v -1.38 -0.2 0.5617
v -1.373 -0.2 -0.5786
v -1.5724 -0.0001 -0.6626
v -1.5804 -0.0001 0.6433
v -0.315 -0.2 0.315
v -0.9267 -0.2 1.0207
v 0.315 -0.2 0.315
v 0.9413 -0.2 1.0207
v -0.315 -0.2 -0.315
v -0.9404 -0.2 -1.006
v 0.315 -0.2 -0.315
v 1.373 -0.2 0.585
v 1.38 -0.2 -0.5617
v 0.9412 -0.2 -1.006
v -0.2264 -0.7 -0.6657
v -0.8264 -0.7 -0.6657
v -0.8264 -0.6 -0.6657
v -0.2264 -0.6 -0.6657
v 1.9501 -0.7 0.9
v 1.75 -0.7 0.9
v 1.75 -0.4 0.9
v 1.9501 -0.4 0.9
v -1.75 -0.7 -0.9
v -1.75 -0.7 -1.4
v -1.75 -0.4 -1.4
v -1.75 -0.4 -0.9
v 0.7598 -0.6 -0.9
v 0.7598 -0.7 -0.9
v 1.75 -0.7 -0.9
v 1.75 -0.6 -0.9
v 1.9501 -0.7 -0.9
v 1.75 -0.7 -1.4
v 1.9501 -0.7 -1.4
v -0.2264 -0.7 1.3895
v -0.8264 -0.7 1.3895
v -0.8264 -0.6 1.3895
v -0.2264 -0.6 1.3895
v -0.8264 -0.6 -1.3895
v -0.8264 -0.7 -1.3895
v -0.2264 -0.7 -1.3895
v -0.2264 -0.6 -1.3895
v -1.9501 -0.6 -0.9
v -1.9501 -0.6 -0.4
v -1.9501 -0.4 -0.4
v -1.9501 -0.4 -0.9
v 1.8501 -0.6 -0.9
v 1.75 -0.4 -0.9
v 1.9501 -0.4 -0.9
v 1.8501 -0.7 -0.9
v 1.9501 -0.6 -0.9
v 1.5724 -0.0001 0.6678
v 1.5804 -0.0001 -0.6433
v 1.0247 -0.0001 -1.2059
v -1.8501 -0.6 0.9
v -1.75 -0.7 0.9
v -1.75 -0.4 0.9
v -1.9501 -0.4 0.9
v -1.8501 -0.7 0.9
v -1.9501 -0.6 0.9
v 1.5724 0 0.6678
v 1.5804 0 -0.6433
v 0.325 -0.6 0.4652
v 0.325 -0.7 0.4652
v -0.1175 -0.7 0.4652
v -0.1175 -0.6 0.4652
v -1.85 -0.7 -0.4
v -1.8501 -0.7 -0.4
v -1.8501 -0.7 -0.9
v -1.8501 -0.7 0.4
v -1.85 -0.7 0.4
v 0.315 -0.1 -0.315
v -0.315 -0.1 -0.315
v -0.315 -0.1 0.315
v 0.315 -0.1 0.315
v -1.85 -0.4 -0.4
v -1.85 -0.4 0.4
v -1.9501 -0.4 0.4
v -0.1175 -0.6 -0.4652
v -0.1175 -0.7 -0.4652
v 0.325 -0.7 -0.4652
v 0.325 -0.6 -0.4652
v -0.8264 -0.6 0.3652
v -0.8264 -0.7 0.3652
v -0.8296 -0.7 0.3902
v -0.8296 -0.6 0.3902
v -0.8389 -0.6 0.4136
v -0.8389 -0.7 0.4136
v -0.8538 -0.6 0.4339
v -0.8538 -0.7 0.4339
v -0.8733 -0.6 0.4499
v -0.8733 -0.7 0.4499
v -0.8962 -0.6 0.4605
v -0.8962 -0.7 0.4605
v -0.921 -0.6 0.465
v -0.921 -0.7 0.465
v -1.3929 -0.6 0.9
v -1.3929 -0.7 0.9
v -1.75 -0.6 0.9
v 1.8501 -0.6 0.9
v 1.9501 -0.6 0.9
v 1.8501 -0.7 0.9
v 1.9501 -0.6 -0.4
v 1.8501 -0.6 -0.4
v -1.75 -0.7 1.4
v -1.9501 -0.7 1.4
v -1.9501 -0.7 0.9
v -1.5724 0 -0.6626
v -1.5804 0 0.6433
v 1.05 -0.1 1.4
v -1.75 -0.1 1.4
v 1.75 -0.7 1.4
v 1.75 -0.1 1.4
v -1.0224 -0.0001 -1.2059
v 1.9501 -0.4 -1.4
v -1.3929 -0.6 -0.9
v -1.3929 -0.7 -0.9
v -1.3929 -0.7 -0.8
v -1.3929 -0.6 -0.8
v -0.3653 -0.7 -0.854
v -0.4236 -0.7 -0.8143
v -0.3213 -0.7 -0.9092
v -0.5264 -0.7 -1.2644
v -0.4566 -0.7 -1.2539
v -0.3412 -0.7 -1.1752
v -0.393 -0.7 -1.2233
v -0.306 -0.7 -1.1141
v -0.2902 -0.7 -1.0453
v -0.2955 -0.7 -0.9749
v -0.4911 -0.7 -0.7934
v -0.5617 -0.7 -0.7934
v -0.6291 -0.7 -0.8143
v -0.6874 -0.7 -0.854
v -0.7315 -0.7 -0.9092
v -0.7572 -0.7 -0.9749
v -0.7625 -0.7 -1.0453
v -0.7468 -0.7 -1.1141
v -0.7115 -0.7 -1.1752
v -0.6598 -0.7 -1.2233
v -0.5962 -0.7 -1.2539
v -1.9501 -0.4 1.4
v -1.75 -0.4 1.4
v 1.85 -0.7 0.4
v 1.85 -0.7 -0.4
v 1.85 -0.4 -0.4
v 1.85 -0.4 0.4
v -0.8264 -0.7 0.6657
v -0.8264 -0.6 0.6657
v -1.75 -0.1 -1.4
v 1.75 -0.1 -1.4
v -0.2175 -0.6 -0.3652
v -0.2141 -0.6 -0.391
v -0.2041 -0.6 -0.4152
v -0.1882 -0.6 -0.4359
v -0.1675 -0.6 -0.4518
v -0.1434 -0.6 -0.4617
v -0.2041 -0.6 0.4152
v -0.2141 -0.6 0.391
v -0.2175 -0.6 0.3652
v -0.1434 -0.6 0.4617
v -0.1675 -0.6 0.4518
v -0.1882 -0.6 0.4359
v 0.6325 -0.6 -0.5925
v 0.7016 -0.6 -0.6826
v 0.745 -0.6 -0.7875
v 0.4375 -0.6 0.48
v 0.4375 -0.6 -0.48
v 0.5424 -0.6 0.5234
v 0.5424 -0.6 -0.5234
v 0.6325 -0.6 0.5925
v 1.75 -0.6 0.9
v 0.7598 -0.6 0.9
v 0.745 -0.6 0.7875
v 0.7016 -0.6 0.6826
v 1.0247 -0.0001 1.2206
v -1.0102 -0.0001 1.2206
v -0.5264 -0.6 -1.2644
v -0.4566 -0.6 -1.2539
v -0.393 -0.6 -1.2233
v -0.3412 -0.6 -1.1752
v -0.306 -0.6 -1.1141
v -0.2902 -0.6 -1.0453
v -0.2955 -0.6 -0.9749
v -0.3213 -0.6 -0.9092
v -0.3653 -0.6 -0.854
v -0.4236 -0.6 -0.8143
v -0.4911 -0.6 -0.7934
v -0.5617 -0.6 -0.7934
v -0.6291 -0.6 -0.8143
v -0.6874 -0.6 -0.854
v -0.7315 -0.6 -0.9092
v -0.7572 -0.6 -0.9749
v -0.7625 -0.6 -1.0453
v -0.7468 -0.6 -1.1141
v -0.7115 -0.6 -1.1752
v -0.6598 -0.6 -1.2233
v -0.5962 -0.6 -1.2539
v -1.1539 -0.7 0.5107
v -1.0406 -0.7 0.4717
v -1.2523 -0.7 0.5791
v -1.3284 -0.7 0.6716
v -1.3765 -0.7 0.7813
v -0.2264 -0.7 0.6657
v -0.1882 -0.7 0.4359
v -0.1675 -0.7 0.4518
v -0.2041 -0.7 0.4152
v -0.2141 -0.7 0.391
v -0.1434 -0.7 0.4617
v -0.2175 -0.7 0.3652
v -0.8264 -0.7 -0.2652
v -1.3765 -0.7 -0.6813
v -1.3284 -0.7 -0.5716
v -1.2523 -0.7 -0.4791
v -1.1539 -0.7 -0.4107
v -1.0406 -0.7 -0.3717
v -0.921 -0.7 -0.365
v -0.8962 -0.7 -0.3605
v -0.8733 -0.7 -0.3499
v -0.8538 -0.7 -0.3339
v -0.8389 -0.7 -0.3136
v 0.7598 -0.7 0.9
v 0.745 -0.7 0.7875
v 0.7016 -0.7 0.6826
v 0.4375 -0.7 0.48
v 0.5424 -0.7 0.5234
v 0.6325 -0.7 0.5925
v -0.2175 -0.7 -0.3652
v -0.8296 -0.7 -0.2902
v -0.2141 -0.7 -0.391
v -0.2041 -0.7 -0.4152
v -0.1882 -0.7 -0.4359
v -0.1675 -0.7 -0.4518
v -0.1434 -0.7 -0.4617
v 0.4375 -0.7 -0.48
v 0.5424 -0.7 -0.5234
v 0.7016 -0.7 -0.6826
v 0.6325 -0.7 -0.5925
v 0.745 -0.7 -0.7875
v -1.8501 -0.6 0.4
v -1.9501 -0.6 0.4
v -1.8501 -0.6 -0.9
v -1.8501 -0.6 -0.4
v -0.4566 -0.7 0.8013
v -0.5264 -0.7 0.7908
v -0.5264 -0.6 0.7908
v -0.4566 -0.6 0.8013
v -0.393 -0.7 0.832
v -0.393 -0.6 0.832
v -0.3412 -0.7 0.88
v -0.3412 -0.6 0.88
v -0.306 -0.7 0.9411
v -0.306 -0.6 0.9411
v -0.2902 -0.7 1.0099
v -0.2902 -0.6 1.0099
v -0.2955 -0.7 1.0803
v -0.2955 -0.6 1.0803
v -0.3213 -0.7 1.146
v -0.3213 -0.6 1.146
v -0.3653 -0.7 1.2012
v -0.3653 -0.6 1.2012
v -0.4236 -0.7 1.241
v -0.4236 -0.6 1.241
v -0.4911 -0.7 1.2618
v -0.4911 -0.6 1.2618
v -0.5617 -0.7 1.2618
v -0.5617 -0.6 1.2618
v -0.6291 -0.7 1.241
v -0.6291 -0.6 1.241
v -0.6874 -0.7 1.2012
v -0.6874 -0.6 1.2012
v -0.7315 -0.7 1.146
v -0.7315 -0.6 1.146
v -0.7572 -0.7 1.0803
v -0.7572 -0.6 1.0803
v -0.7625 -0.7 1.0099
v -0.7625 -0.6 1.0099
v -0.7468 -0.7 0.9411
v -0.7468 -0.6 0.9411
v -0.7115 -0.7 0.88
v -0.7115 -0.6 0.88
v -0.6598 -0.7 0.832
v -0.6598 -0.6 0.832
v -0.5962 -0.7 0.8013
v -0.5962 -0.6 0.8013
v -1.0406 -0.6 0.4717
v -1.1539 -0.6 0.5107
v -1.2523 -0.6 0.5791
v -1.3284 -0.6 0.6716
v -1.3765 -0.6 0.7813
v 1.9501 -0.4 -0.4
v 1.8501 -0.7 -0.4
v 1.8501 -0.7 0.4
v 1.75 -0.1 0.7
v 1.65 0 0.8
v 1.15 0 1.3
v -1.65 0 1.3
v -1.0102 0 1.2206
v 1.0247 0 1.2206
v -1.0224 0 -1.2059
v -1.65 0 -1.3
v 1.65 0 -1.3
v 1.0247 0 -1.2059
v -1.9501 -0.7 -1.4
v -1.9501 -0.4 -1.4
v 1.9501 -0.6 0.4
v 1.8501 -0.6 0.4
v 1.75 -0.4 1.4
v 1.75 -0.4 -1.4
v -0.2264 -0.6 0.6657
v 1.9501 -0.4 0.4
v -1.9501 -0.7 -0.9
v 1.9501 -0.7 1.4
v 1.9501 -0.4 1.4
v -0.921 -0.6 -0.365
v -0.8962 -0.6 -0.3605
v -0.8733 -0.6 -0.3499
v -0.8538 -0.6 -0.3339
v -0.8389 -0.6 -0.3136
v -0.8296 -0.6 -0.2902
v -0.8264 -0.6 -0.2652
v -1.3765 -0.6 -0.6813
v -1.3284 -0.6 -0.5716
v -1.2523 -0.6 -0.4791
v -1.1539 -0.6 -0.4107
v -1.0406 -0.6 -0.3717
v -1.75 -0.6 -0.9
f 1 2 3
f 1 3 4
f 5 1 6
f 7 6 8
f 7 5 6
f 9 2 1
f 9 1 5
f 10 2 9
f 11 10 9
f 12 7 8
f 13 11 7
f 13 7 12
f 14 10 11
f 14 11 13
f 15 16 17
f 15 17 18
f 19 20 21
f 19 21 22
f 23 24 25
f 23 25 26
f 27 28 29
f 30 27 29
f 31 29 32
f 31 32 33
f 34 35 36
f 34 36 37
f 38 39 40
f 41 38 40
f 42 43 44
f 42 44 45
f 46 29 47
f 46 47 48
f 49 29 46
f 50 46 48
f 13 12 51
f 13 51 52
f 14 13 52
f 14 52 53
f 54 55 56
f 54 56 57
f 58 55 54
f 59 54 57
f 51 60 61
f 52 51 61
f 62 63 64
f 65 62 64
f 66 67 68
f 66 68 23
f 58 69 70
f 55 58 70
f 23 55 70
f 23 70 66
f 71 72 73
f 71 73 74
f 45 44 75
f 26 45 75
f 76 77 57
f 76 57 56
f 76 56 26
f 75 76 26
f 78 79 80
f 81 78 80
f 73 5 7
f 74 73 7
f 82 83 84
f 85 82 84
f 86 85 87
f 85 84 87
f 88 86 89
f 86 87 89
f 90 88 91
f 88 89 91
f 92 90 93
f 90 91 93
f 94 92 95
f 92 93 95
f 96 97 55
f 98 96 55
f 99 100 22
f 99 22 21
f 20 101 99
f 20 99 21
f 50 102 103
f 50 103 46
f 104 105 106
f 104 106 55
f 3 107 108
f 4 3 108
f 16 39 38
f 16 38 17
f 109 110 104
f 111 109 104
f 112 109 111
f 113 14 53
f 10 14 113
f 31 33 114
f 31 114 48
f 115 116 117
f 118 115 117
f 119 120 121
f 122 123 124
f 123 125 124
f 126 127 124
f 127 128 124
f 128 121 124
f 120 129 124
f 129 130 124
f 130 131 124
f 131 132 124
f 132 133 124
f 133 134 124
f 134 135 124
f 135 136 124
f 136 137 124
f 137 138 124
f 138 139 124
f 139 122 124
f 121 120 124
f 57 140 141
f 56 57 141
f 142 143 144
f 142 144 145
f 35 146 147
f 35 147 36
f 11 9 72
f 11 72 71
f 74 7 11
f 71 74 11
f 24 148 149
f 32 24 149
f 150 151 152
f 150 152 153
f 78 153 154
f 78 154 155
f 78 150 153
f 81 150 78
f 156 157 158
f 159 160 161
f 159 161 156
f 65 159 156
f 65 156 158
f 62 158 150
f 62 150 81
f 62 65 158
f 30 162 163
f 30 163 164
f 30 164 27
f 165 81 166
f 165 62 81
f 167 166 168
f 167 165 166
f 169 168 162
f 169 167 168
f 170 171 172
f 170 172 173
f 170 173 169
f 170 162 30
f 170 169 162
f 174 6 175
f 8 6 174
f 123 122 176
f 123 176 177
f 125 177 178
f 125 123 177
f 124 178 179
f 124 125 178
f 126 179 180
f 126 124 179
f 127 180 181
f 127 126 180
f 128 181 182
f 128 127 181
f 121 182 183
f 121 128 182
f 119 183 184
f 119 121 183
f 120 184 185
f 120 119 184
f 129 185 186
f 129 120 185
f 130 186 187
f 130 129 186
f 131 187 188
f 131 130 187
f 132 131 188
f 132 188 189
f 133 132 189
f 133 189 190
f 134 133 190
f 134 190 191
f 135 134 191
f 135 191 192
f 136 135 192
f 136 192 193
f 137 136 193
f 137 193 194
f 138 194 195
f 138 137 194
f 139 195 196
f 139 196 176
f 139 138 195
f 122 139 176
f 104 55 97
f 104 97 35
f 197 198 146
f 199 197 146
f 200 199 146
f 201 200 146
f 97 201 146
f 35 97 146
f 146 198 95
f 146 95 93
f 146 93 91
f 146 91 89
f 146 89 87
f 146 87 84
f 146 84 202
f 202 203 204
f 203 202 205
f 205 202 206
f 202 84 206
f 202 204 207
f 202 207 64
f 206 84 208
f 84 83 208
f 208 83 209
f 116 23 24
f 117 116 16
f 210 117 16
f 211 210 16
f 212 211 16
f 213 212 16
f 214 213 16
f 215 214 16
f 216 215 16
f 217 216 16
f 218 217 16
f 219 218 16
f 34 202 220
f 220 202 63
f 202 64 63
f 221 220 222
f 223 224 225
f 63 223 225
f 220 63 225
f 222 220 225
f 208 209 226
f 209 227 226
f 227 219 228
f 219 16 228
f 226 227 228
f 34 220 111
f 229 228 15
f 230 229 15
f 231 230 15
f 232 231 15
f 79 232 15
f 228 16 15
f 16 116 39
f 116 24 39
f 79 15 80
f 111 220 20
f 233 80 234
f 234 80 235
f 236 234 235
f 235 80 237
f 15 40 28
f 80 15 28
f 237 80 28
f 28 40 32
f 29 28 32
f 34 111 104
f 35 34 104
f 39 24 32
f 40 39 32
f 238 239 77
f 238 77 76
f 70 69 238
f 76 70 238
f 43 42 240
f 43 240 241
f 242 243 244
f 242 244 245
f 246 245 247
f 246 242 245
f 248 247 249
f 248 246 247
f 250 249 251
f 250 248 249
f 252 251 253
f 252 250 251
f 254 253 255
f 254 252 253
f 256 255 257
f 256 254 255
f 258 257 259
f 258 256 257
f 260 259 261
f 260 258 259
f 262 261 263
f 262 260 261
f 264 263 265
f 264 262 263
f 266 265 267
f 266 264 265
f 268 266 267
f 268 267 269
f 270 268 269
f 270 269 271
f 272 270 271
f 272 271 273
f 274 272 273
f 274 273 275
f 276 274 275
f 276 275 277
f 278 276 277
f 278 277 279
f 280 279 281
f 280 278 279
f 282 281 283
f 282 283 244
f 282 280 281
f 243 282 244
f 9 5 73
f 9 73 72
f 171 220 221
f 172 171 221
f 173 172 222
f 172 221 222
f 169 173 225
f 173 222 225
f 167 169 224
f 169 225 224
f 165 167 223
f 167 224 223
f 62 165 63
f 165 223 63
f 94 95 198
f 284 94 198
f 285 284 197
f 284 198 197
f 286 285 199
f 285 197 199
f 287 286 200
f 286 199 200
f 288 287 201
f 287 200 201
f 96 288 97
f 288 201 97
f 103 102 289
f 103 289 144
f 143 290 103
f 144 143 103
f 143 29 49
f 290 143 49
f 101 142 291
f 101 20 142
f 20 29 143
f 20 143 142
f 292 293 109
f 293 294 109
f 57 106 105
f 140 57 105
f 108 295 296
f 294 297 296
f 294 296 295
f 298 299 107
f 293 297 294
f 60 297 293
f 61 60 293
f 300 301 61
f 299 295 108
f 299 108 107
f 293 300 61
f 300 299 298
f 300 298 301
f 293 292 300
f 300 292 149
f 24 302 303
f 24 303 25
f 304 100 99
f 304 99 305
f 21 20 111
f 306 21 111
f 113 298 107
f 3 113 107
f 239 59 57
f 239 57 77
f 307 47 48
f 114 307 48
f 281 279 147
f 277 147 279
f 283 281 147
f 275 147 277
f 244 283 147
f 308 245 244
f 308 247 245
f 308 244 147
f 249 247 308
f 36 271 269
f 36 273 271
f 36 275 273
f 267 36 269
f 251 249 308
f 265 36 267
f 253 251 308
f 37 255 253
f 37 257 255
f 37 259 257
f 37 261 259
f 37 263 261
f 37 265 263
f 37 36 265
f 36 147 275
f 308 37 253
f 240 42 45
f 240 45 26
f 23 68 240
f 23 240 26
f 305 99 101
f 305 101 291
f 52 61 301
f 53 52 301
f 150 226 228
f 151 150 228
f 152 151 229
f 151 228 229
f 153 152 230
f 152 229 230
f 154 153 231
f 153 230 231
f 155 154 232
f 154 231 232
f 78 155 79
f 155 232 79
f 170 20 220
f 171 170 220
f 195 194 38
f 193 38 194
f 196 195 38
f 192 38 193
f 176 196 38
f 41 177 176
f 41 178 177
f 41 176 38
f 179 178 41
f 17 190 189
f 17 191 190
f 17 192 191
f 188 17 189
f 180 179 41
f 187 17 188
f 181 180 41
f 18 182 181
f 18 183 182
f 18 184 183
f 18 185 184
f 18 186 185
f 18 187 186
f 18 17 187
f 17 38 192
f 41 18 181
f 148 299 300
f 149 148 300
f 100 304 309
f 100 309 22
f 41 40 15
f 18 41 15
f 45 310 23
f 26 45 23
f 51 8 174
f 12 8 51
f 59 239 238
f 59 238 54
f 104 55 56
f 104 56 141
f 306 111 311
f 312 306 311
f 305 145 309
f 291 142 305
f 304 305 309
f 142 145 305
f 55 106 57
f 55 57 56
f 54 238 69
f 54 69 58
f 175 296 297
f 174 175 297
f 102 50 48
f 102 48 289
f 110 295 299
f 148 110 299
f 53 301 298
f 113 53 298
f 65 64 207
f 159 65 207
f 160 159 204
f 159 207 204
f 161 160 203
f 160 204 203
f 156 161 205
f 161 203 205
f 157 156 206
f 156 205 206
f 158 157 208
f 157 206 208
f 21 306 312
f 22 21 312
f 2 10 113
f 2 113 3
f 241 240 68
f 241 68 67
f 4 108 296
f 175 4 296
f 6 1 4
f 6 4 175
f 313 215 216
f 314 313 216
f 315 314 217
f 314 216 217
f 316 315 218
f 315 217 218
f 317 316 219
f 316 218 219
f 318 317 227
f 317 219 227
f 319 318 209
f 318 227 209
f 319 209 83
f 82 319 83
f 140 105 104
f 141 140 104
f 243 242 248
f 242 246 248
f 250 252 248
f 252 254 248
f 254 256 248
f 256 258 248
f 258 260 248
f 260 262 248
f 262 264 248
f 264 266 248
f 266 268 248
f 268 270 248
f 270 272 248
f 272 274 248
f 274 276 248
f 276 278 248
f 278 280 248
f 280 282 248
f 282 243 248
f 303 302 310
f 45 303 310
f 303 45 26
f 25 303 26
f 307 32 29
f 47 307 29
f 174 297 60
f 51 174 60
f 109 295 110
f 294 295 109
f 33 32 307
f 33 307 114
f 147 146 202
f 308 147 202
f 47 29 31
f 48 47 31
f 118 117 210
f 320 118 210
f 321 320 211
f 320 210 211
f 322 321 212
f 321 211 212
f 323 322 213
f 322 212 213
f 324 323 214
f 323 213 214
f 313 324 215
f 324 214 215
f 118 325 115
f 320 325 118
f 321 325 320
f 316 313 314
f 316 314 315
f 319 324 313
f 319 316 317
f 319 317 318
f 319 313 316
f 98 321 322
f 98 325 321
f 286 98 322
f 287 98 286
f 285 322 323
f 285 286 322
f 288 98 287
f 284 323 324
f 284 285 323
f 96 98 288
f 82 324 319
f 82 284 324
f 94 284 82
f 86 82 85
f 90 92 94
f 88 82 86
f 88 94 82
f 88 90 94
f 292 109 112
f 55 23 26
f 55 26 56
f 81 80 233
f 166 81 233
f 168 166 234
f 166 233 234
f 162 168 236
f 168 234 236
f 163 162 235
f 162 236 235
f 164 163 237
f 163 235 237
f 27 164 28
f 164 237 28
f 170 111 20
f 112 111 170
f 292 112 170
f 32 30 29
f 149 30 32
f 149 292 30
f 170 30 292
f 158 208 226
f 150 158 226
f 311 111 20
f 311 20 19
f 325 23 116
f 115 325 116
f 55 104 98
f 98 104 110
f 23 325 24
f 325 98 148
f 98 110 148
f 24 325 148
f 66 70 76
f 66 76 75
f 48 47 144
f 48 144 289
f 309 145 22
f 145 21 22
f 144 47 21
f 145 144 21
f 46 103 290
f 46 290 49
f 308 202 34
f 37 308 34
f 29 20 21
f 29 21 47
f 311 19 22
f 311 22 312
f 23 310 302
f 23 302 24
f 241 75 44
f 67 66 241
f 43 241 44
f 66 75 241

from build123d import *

# Parameters (mm, degrees)
SKETCH8_W             = 3.5
SKETCH8_H             = 2.8
BOSS_EXTRUDE3_DEPTH   = 0.7
CUT_EXTRUDE2_DEPTH    = 0.2
CHAMFER1_SIZE         = 0.1
CUT_EXTRUDE3_DEPTH    = 0.1
SKETCH12_W            = 0.200076611
SKETCH12_H            = 0.5
BOSS_EXTRUDE4_DEPTH   = 0.3
BOSS_EXTRUDE4_2_DEPTH = 0.3
BOSS_EXTRUDE4_3_DEPTH = 0.3
BOSS_EXTRUDE4_4_DEPTH = 0.3
BOSS_EXTRUDE8_DEPTH   = 0.3
BOSS_EXTRUDE8_2_DEPTH = 0.3
SKETCH15_W            = 0.6
SKETCH15_H            = 0.723719119
SKETCH15_R            = 0.236799963
CUT_EXTRUDE12_DEPTH   = 0.1
CHAMFER5_SIZE         = 0.2
SKETCH25_W            = 0.63
SKETCH25_H            = 0.63
BOSS_EXTRUDE13_DEPTH  = 0.1
SKETCH27_W            = 0.5
SKETCH27_H            = 0.1
CUT_EXTRUDE25_DEPTH   = 0.1
SKETCH30_W            = 0.5
SKETCH30_H            = 0.1
CUT_EXTRUDE26_DEPTH   = 0.1
SKETCH31_W            = 0.5
SKETCH31_H            = 0.1
CUT_EXTRUDE27_DEPTH   = 0.1
SKETCH32_W            = 0.5
SKETCH32_H            = 0.1
CUT_EXTRUDE28_DEPTH   = 0.1


with BuildPart() as part:
    # Sketch8 → Boss-Extrude3 (new body)
    with BuildSketch(Plane(origin=(0, 0, 0), x_dir=(1, 0, 0), z_dir=(0, 1, 0))):
        Rectangle(SKETCH8_W, SKETCH8_H)
    extrude(amount=-BOSS_EXTRUDE3_DEPTH)

    # Sketch9 → Cut-Extrude2 (cut)
    with BuildSketch(Plane(origin=(0, 0, 0), x_dir=(1, 0, 0), z_dir=(0, 1, 0))):
        Polygon((-1.022435057, 1.205886324), (-1.572389449, 0.66264326), (-1.580406785, -0.6432877), (-1.010176789, -1.220562425), (1.024673791, -1.220562425), (1.572357881, -0.667785303), (1.580406785, 0.6432877), (1.024673791, 1.205886324), align=None)
    extrude(amount=-CUT_EXTRUDE2_DEPTH, mode=Mode.SUBTRACT)

    # Chamfer1
    chamfer1_edges = [part.edges().sort_by_distance(p)[0] for p in [
        (-1.75, 0, 0),
        (0, 0, -1.4),
        (1.75, 0, 0),
        (0, 0, 1.4),
    ]]
    chamfer(chamfer1_edges, length=CHAMFER1_SIZE)

    # Sketch10 → Cut-Extrude3 (cut)
    with BuildSketch(Plane(origin=(0, 0, 0), x_dir=(1, 0, 0), z_dir=(0, 1, 0))):
        Polygon((1.75, -0.7), (1.05, -1.4), (1.75, -1.4), align=None)
    extrude(amount=-CUT_EXTRUDE3_DEPTH, mode=Mode.SUBTRACT)

    # Sketch15 → Cut-Extrude12 (cut)
    # profile 1 of 4: a face of its own
    with BuildSketch(Plane.XZ.offset(0.7)):
        with BuildLine():
            Line((1.75, -0.9), (1.75, 0.9))
            Line((1.75, 0.9), (0.759841575, 0.9))
            ThreePointArc((0.759841575, 0.9), (0.632478155, 0.592517505), (0.32499566, 0.465154085))
            Line((0.32499566, 0.465154085), (-0.117527877, 0.465154085))
            ThreePointArc((-0.117527877, 0.465154085), (-0.188238555, 0.435864763), (-0.217527877, 0.365154085))
            Line((-0.217527877, 0.365154085), (-0.217527877, -0.365154085))
            ThreePointArc((-0.217527877, -0.365154085), (-0.188238555, -0.435864763), (-0.117527877, -0.465154085))
            Line((-0.117527877, -0.465154085), (0.32499566, -0.465154085))
            ThreePointArc((0.32499566, -0.465154085), (0.632478155, -0.592517505), (0.759841575, -0.9))
            Line((0.759841575, -0.9), (1.75, -0.9))
        make_face()
    # profile 2 of 4: a face of its own
    with BuildSketch(Plane.XZ.offset(0.7)):
        with BuildLine():
            Line((-1.392928117, 0.9), (-1.75, 0.9))
            Line((-1.75, 0.9), (-1.75, -0.9))
            Line((-1.75, -0.9), (-1.392928117, -0.9))
            Line((-1.392928117, -0.9), (-1.392928117, -0.8))
            ThreePointArc((-1.392928117, -0.8), (-1.252278886, -0.479083743), (-0.920984108, -0.365008244))
            ThreePointArc((-0.920984108, -0.365008244), (-0.853788556, -0.333929517), (-0.826382909, -0.265154085))
            Line((-0.826382909, -0.265154085), (-0.826382909, 0.365154085))
            ThreePointArc((-0.826382909, 0.365154085), (-0.853788556, 0.433929517), (-0.920984108, 0.465008244))
            ThreePointArc((-0.920984108, 0.465008244), (-1.252278886, 0.579083743), (-1.392928117, 0.9))
        make_face()
    # profile 3 of 4: a face of its own
    with BuildSketch(Plane.XZ.offset(0.7)):
        with Locations((-0.526382909, -1.027603704)):
            Rectangle(SKETCH15_W, SKETCH15_H)
        with Locations(Location((-0.526382909, -1.027603704, 0), (0, 0, 270))):
            Circle(SKETCH15_R, mode=Mode.SUBTRACT)
    # profile 4 of 4: a face of its own
    with BuildSketch(Plane.XZ.offset(0.7)):
        with Locations((-0.526382909, 1.027603704)):
            Rectangle(SKETCH15_W, SKETCH15_H)
        with Locations(Location((-0.526382909, 1.027603704, 0), (0, 0, 270))):
            Circle(SKETCH15_R, mode=Mode.SUBTRACT)
    extrude(amount=-CUT_EXTRUDE12_DEPTH, mode=Mode.SUBTRACT)

    # Chamfer5
    chamfer5_edges = [part.edges().sort_by_distance(p)[0] for p in [
        (1.302540288, -0.2, -0.924587012),
        (1.576382333, -0.2, 0.012248802),
        (1.298515836, -0.2, 0.944173864),
        (0.007248501, -0.2, 1.220562425),
        (-1.295291787, -0.2, 0.931925062),
        (-1.576398117, -0.2, -0.00967778),
        (-1.297412253, -0.2, -0.934264792),
        (0.001119367, -0.2, -1.205886324),
    ]]
    chamfer(chamfer5_edges, length=CHAMFER5_SIZE - 0.0001)  # a hair under: the kernel refuses the full size

    # Sketch25 → Boss-Extrude13 (add)
    with BuildSketch(Plane(origin=(0, -0.2, 0), x_dir=(1, 0, 0), z_dir=(0, 1, 0))):
        Rectangle(SKETCH25_W, SKETCH25_H)
    extrude(amount=BOSS_EXTRUDE13_DEPTH)


with BuildPart() as body_2:
    # Sketch12 → Boss-Extrude4 (new body)
    with BuildSketch(Plane.XZ.offset(0.7)):
        with Locations((-1.850038306, -1.15)):
            Rectangle(SKETCH12_W, SKETCH12_H)
    extrude(amount=-BOSS_EXTRUDE4_DEPTH)


with BuildPart() as body_3:
    # Sketch12 → Boss-Extrude4 2 (new body)
    with BuildSketch(Plane.XZ.offset(0.7)):
        with Locations((-1.850038306, 1.15)):
            Rectangle(SKETCH12_W, SKETCH12_H)
    extrude(amount=-BOSS_EXTRUDE4_2_DEPTH)


with BuildPart() as body_4:
    # Sketch12 → Boss-Extrude4 3 (new body)
    with BuildSketch(Plane.XZ.offset(0.7)):
        with Locations((1.850038306, 1.15)):
            Rectangle(SKETCH12_W, SKETCH12_H)
    extrude(amount=-BOSS_EXTRUDE4_3_DEPTH)


with BuildPart() as body_5:
    # Sketch12 → Boss-Extrude4 4 (new body)
    with BuildSketch(Plane.XZ.offset(0.7)):
        with Locations((1.850038306, -1.15)):
            Rectangle(SKETCH12_W, SKETCH12_H)
    extrude(amount=-BOSS_EXTRUDE4_4_DEPTH)


with BuildPart() as body_6:
    # Sketch13 → Boss-Extrude8 (new body)
    with BuildSketch(Plane.XZ.offset(0.7)):
        Polygon((1.950076611, 0.9), (1.75, 0.9), (1.75, 0.4), (1.75, -0.4), (1.75, -0.9), (1.950076611, -0.9), (1.950076611, -0.4), (1.850038305, -0.4), (1.850038305, 0.4), (1.950076611, 0.4), align=None)
    extrude(amount=-BOSS_EXTRUDE8_DEPTH)

    # Sketch27 → Cut-Extrude25 (cut)
    with BuildSketch(Plane(origin=(1.950076611, 0, 0), x_dir=(0, 0, -1), z_dir=(1, 0, 0))):
        with Locations((0.65, -0.65)):
            Rectangle(SKETCH27_W, SKETCH27_H)
    extrude(amount=-CUT_EXTRUDE25_DEPTH, mode=Mode.SUBTRACT)

    # Sketch30 → Cut-Extrude26 (cut)
    with BuildSketch(Plane(origin=(1.950076611, 0, 0), x_dir=(0, 0, -1), z_dir=(1, 0, 0))):
        with Locations((-0.65, -0.65)):
            Rectangle(SKETCH30_W, SKETCH30_H)
    extrude(amount=-CUT_EXTRUDE26_DEPTH, mode=Mode.SUBTRACT)


with BuildPart() as body_7:
    # Sketch13 → Boss-Extrude8 2 (new body)
    with BuildSketch(Plane.XZ.offset(0.7)):
        Polygon((-1.75, -0.9), (-1.75, -0.4), (-1.75, 0.4), (-1.75, 0.9), (-1.950076611, 0.9), (-1.950076611, 0.4), (-1.850038305, 0.4), (-1.850038305, -0.4), (-1.950076611, -0.4), (-1.950076611, -0.9), align=None)
    extrude(amount=-BOSS_EXTRUDE8_2_DEPTH)

    # Sketch31 → Cut-Extrude27 (cut)
    with BuildSketch(Plane.ZY.offset(1.950076611)):
        with Locations((-0.65, -0.65)):
            Rectangle(SKETCH31_W, SKETCH31_H)
    extrude(amount=-CUT_EXTRUDE27_DEPTH, mode=Mode.SUBTRACT)

    # Sketch32 → Cut-Extrude28 (cut)
    with BuildSketch(Plane.ZY.offset(1.950076611)):
        with Locations((0.65, -0.65)):
            Rectangle(SKETCH32_W, SKETCH32_H)
    extrude(amount=-CUT_EXTRUDE28_DEPTH, mode=Mode.SUBTRACT)


solid = Compound([part.part, body_2.part, body_3.part, body_4.part, body_5.part, body_6.part, body_7.part])
